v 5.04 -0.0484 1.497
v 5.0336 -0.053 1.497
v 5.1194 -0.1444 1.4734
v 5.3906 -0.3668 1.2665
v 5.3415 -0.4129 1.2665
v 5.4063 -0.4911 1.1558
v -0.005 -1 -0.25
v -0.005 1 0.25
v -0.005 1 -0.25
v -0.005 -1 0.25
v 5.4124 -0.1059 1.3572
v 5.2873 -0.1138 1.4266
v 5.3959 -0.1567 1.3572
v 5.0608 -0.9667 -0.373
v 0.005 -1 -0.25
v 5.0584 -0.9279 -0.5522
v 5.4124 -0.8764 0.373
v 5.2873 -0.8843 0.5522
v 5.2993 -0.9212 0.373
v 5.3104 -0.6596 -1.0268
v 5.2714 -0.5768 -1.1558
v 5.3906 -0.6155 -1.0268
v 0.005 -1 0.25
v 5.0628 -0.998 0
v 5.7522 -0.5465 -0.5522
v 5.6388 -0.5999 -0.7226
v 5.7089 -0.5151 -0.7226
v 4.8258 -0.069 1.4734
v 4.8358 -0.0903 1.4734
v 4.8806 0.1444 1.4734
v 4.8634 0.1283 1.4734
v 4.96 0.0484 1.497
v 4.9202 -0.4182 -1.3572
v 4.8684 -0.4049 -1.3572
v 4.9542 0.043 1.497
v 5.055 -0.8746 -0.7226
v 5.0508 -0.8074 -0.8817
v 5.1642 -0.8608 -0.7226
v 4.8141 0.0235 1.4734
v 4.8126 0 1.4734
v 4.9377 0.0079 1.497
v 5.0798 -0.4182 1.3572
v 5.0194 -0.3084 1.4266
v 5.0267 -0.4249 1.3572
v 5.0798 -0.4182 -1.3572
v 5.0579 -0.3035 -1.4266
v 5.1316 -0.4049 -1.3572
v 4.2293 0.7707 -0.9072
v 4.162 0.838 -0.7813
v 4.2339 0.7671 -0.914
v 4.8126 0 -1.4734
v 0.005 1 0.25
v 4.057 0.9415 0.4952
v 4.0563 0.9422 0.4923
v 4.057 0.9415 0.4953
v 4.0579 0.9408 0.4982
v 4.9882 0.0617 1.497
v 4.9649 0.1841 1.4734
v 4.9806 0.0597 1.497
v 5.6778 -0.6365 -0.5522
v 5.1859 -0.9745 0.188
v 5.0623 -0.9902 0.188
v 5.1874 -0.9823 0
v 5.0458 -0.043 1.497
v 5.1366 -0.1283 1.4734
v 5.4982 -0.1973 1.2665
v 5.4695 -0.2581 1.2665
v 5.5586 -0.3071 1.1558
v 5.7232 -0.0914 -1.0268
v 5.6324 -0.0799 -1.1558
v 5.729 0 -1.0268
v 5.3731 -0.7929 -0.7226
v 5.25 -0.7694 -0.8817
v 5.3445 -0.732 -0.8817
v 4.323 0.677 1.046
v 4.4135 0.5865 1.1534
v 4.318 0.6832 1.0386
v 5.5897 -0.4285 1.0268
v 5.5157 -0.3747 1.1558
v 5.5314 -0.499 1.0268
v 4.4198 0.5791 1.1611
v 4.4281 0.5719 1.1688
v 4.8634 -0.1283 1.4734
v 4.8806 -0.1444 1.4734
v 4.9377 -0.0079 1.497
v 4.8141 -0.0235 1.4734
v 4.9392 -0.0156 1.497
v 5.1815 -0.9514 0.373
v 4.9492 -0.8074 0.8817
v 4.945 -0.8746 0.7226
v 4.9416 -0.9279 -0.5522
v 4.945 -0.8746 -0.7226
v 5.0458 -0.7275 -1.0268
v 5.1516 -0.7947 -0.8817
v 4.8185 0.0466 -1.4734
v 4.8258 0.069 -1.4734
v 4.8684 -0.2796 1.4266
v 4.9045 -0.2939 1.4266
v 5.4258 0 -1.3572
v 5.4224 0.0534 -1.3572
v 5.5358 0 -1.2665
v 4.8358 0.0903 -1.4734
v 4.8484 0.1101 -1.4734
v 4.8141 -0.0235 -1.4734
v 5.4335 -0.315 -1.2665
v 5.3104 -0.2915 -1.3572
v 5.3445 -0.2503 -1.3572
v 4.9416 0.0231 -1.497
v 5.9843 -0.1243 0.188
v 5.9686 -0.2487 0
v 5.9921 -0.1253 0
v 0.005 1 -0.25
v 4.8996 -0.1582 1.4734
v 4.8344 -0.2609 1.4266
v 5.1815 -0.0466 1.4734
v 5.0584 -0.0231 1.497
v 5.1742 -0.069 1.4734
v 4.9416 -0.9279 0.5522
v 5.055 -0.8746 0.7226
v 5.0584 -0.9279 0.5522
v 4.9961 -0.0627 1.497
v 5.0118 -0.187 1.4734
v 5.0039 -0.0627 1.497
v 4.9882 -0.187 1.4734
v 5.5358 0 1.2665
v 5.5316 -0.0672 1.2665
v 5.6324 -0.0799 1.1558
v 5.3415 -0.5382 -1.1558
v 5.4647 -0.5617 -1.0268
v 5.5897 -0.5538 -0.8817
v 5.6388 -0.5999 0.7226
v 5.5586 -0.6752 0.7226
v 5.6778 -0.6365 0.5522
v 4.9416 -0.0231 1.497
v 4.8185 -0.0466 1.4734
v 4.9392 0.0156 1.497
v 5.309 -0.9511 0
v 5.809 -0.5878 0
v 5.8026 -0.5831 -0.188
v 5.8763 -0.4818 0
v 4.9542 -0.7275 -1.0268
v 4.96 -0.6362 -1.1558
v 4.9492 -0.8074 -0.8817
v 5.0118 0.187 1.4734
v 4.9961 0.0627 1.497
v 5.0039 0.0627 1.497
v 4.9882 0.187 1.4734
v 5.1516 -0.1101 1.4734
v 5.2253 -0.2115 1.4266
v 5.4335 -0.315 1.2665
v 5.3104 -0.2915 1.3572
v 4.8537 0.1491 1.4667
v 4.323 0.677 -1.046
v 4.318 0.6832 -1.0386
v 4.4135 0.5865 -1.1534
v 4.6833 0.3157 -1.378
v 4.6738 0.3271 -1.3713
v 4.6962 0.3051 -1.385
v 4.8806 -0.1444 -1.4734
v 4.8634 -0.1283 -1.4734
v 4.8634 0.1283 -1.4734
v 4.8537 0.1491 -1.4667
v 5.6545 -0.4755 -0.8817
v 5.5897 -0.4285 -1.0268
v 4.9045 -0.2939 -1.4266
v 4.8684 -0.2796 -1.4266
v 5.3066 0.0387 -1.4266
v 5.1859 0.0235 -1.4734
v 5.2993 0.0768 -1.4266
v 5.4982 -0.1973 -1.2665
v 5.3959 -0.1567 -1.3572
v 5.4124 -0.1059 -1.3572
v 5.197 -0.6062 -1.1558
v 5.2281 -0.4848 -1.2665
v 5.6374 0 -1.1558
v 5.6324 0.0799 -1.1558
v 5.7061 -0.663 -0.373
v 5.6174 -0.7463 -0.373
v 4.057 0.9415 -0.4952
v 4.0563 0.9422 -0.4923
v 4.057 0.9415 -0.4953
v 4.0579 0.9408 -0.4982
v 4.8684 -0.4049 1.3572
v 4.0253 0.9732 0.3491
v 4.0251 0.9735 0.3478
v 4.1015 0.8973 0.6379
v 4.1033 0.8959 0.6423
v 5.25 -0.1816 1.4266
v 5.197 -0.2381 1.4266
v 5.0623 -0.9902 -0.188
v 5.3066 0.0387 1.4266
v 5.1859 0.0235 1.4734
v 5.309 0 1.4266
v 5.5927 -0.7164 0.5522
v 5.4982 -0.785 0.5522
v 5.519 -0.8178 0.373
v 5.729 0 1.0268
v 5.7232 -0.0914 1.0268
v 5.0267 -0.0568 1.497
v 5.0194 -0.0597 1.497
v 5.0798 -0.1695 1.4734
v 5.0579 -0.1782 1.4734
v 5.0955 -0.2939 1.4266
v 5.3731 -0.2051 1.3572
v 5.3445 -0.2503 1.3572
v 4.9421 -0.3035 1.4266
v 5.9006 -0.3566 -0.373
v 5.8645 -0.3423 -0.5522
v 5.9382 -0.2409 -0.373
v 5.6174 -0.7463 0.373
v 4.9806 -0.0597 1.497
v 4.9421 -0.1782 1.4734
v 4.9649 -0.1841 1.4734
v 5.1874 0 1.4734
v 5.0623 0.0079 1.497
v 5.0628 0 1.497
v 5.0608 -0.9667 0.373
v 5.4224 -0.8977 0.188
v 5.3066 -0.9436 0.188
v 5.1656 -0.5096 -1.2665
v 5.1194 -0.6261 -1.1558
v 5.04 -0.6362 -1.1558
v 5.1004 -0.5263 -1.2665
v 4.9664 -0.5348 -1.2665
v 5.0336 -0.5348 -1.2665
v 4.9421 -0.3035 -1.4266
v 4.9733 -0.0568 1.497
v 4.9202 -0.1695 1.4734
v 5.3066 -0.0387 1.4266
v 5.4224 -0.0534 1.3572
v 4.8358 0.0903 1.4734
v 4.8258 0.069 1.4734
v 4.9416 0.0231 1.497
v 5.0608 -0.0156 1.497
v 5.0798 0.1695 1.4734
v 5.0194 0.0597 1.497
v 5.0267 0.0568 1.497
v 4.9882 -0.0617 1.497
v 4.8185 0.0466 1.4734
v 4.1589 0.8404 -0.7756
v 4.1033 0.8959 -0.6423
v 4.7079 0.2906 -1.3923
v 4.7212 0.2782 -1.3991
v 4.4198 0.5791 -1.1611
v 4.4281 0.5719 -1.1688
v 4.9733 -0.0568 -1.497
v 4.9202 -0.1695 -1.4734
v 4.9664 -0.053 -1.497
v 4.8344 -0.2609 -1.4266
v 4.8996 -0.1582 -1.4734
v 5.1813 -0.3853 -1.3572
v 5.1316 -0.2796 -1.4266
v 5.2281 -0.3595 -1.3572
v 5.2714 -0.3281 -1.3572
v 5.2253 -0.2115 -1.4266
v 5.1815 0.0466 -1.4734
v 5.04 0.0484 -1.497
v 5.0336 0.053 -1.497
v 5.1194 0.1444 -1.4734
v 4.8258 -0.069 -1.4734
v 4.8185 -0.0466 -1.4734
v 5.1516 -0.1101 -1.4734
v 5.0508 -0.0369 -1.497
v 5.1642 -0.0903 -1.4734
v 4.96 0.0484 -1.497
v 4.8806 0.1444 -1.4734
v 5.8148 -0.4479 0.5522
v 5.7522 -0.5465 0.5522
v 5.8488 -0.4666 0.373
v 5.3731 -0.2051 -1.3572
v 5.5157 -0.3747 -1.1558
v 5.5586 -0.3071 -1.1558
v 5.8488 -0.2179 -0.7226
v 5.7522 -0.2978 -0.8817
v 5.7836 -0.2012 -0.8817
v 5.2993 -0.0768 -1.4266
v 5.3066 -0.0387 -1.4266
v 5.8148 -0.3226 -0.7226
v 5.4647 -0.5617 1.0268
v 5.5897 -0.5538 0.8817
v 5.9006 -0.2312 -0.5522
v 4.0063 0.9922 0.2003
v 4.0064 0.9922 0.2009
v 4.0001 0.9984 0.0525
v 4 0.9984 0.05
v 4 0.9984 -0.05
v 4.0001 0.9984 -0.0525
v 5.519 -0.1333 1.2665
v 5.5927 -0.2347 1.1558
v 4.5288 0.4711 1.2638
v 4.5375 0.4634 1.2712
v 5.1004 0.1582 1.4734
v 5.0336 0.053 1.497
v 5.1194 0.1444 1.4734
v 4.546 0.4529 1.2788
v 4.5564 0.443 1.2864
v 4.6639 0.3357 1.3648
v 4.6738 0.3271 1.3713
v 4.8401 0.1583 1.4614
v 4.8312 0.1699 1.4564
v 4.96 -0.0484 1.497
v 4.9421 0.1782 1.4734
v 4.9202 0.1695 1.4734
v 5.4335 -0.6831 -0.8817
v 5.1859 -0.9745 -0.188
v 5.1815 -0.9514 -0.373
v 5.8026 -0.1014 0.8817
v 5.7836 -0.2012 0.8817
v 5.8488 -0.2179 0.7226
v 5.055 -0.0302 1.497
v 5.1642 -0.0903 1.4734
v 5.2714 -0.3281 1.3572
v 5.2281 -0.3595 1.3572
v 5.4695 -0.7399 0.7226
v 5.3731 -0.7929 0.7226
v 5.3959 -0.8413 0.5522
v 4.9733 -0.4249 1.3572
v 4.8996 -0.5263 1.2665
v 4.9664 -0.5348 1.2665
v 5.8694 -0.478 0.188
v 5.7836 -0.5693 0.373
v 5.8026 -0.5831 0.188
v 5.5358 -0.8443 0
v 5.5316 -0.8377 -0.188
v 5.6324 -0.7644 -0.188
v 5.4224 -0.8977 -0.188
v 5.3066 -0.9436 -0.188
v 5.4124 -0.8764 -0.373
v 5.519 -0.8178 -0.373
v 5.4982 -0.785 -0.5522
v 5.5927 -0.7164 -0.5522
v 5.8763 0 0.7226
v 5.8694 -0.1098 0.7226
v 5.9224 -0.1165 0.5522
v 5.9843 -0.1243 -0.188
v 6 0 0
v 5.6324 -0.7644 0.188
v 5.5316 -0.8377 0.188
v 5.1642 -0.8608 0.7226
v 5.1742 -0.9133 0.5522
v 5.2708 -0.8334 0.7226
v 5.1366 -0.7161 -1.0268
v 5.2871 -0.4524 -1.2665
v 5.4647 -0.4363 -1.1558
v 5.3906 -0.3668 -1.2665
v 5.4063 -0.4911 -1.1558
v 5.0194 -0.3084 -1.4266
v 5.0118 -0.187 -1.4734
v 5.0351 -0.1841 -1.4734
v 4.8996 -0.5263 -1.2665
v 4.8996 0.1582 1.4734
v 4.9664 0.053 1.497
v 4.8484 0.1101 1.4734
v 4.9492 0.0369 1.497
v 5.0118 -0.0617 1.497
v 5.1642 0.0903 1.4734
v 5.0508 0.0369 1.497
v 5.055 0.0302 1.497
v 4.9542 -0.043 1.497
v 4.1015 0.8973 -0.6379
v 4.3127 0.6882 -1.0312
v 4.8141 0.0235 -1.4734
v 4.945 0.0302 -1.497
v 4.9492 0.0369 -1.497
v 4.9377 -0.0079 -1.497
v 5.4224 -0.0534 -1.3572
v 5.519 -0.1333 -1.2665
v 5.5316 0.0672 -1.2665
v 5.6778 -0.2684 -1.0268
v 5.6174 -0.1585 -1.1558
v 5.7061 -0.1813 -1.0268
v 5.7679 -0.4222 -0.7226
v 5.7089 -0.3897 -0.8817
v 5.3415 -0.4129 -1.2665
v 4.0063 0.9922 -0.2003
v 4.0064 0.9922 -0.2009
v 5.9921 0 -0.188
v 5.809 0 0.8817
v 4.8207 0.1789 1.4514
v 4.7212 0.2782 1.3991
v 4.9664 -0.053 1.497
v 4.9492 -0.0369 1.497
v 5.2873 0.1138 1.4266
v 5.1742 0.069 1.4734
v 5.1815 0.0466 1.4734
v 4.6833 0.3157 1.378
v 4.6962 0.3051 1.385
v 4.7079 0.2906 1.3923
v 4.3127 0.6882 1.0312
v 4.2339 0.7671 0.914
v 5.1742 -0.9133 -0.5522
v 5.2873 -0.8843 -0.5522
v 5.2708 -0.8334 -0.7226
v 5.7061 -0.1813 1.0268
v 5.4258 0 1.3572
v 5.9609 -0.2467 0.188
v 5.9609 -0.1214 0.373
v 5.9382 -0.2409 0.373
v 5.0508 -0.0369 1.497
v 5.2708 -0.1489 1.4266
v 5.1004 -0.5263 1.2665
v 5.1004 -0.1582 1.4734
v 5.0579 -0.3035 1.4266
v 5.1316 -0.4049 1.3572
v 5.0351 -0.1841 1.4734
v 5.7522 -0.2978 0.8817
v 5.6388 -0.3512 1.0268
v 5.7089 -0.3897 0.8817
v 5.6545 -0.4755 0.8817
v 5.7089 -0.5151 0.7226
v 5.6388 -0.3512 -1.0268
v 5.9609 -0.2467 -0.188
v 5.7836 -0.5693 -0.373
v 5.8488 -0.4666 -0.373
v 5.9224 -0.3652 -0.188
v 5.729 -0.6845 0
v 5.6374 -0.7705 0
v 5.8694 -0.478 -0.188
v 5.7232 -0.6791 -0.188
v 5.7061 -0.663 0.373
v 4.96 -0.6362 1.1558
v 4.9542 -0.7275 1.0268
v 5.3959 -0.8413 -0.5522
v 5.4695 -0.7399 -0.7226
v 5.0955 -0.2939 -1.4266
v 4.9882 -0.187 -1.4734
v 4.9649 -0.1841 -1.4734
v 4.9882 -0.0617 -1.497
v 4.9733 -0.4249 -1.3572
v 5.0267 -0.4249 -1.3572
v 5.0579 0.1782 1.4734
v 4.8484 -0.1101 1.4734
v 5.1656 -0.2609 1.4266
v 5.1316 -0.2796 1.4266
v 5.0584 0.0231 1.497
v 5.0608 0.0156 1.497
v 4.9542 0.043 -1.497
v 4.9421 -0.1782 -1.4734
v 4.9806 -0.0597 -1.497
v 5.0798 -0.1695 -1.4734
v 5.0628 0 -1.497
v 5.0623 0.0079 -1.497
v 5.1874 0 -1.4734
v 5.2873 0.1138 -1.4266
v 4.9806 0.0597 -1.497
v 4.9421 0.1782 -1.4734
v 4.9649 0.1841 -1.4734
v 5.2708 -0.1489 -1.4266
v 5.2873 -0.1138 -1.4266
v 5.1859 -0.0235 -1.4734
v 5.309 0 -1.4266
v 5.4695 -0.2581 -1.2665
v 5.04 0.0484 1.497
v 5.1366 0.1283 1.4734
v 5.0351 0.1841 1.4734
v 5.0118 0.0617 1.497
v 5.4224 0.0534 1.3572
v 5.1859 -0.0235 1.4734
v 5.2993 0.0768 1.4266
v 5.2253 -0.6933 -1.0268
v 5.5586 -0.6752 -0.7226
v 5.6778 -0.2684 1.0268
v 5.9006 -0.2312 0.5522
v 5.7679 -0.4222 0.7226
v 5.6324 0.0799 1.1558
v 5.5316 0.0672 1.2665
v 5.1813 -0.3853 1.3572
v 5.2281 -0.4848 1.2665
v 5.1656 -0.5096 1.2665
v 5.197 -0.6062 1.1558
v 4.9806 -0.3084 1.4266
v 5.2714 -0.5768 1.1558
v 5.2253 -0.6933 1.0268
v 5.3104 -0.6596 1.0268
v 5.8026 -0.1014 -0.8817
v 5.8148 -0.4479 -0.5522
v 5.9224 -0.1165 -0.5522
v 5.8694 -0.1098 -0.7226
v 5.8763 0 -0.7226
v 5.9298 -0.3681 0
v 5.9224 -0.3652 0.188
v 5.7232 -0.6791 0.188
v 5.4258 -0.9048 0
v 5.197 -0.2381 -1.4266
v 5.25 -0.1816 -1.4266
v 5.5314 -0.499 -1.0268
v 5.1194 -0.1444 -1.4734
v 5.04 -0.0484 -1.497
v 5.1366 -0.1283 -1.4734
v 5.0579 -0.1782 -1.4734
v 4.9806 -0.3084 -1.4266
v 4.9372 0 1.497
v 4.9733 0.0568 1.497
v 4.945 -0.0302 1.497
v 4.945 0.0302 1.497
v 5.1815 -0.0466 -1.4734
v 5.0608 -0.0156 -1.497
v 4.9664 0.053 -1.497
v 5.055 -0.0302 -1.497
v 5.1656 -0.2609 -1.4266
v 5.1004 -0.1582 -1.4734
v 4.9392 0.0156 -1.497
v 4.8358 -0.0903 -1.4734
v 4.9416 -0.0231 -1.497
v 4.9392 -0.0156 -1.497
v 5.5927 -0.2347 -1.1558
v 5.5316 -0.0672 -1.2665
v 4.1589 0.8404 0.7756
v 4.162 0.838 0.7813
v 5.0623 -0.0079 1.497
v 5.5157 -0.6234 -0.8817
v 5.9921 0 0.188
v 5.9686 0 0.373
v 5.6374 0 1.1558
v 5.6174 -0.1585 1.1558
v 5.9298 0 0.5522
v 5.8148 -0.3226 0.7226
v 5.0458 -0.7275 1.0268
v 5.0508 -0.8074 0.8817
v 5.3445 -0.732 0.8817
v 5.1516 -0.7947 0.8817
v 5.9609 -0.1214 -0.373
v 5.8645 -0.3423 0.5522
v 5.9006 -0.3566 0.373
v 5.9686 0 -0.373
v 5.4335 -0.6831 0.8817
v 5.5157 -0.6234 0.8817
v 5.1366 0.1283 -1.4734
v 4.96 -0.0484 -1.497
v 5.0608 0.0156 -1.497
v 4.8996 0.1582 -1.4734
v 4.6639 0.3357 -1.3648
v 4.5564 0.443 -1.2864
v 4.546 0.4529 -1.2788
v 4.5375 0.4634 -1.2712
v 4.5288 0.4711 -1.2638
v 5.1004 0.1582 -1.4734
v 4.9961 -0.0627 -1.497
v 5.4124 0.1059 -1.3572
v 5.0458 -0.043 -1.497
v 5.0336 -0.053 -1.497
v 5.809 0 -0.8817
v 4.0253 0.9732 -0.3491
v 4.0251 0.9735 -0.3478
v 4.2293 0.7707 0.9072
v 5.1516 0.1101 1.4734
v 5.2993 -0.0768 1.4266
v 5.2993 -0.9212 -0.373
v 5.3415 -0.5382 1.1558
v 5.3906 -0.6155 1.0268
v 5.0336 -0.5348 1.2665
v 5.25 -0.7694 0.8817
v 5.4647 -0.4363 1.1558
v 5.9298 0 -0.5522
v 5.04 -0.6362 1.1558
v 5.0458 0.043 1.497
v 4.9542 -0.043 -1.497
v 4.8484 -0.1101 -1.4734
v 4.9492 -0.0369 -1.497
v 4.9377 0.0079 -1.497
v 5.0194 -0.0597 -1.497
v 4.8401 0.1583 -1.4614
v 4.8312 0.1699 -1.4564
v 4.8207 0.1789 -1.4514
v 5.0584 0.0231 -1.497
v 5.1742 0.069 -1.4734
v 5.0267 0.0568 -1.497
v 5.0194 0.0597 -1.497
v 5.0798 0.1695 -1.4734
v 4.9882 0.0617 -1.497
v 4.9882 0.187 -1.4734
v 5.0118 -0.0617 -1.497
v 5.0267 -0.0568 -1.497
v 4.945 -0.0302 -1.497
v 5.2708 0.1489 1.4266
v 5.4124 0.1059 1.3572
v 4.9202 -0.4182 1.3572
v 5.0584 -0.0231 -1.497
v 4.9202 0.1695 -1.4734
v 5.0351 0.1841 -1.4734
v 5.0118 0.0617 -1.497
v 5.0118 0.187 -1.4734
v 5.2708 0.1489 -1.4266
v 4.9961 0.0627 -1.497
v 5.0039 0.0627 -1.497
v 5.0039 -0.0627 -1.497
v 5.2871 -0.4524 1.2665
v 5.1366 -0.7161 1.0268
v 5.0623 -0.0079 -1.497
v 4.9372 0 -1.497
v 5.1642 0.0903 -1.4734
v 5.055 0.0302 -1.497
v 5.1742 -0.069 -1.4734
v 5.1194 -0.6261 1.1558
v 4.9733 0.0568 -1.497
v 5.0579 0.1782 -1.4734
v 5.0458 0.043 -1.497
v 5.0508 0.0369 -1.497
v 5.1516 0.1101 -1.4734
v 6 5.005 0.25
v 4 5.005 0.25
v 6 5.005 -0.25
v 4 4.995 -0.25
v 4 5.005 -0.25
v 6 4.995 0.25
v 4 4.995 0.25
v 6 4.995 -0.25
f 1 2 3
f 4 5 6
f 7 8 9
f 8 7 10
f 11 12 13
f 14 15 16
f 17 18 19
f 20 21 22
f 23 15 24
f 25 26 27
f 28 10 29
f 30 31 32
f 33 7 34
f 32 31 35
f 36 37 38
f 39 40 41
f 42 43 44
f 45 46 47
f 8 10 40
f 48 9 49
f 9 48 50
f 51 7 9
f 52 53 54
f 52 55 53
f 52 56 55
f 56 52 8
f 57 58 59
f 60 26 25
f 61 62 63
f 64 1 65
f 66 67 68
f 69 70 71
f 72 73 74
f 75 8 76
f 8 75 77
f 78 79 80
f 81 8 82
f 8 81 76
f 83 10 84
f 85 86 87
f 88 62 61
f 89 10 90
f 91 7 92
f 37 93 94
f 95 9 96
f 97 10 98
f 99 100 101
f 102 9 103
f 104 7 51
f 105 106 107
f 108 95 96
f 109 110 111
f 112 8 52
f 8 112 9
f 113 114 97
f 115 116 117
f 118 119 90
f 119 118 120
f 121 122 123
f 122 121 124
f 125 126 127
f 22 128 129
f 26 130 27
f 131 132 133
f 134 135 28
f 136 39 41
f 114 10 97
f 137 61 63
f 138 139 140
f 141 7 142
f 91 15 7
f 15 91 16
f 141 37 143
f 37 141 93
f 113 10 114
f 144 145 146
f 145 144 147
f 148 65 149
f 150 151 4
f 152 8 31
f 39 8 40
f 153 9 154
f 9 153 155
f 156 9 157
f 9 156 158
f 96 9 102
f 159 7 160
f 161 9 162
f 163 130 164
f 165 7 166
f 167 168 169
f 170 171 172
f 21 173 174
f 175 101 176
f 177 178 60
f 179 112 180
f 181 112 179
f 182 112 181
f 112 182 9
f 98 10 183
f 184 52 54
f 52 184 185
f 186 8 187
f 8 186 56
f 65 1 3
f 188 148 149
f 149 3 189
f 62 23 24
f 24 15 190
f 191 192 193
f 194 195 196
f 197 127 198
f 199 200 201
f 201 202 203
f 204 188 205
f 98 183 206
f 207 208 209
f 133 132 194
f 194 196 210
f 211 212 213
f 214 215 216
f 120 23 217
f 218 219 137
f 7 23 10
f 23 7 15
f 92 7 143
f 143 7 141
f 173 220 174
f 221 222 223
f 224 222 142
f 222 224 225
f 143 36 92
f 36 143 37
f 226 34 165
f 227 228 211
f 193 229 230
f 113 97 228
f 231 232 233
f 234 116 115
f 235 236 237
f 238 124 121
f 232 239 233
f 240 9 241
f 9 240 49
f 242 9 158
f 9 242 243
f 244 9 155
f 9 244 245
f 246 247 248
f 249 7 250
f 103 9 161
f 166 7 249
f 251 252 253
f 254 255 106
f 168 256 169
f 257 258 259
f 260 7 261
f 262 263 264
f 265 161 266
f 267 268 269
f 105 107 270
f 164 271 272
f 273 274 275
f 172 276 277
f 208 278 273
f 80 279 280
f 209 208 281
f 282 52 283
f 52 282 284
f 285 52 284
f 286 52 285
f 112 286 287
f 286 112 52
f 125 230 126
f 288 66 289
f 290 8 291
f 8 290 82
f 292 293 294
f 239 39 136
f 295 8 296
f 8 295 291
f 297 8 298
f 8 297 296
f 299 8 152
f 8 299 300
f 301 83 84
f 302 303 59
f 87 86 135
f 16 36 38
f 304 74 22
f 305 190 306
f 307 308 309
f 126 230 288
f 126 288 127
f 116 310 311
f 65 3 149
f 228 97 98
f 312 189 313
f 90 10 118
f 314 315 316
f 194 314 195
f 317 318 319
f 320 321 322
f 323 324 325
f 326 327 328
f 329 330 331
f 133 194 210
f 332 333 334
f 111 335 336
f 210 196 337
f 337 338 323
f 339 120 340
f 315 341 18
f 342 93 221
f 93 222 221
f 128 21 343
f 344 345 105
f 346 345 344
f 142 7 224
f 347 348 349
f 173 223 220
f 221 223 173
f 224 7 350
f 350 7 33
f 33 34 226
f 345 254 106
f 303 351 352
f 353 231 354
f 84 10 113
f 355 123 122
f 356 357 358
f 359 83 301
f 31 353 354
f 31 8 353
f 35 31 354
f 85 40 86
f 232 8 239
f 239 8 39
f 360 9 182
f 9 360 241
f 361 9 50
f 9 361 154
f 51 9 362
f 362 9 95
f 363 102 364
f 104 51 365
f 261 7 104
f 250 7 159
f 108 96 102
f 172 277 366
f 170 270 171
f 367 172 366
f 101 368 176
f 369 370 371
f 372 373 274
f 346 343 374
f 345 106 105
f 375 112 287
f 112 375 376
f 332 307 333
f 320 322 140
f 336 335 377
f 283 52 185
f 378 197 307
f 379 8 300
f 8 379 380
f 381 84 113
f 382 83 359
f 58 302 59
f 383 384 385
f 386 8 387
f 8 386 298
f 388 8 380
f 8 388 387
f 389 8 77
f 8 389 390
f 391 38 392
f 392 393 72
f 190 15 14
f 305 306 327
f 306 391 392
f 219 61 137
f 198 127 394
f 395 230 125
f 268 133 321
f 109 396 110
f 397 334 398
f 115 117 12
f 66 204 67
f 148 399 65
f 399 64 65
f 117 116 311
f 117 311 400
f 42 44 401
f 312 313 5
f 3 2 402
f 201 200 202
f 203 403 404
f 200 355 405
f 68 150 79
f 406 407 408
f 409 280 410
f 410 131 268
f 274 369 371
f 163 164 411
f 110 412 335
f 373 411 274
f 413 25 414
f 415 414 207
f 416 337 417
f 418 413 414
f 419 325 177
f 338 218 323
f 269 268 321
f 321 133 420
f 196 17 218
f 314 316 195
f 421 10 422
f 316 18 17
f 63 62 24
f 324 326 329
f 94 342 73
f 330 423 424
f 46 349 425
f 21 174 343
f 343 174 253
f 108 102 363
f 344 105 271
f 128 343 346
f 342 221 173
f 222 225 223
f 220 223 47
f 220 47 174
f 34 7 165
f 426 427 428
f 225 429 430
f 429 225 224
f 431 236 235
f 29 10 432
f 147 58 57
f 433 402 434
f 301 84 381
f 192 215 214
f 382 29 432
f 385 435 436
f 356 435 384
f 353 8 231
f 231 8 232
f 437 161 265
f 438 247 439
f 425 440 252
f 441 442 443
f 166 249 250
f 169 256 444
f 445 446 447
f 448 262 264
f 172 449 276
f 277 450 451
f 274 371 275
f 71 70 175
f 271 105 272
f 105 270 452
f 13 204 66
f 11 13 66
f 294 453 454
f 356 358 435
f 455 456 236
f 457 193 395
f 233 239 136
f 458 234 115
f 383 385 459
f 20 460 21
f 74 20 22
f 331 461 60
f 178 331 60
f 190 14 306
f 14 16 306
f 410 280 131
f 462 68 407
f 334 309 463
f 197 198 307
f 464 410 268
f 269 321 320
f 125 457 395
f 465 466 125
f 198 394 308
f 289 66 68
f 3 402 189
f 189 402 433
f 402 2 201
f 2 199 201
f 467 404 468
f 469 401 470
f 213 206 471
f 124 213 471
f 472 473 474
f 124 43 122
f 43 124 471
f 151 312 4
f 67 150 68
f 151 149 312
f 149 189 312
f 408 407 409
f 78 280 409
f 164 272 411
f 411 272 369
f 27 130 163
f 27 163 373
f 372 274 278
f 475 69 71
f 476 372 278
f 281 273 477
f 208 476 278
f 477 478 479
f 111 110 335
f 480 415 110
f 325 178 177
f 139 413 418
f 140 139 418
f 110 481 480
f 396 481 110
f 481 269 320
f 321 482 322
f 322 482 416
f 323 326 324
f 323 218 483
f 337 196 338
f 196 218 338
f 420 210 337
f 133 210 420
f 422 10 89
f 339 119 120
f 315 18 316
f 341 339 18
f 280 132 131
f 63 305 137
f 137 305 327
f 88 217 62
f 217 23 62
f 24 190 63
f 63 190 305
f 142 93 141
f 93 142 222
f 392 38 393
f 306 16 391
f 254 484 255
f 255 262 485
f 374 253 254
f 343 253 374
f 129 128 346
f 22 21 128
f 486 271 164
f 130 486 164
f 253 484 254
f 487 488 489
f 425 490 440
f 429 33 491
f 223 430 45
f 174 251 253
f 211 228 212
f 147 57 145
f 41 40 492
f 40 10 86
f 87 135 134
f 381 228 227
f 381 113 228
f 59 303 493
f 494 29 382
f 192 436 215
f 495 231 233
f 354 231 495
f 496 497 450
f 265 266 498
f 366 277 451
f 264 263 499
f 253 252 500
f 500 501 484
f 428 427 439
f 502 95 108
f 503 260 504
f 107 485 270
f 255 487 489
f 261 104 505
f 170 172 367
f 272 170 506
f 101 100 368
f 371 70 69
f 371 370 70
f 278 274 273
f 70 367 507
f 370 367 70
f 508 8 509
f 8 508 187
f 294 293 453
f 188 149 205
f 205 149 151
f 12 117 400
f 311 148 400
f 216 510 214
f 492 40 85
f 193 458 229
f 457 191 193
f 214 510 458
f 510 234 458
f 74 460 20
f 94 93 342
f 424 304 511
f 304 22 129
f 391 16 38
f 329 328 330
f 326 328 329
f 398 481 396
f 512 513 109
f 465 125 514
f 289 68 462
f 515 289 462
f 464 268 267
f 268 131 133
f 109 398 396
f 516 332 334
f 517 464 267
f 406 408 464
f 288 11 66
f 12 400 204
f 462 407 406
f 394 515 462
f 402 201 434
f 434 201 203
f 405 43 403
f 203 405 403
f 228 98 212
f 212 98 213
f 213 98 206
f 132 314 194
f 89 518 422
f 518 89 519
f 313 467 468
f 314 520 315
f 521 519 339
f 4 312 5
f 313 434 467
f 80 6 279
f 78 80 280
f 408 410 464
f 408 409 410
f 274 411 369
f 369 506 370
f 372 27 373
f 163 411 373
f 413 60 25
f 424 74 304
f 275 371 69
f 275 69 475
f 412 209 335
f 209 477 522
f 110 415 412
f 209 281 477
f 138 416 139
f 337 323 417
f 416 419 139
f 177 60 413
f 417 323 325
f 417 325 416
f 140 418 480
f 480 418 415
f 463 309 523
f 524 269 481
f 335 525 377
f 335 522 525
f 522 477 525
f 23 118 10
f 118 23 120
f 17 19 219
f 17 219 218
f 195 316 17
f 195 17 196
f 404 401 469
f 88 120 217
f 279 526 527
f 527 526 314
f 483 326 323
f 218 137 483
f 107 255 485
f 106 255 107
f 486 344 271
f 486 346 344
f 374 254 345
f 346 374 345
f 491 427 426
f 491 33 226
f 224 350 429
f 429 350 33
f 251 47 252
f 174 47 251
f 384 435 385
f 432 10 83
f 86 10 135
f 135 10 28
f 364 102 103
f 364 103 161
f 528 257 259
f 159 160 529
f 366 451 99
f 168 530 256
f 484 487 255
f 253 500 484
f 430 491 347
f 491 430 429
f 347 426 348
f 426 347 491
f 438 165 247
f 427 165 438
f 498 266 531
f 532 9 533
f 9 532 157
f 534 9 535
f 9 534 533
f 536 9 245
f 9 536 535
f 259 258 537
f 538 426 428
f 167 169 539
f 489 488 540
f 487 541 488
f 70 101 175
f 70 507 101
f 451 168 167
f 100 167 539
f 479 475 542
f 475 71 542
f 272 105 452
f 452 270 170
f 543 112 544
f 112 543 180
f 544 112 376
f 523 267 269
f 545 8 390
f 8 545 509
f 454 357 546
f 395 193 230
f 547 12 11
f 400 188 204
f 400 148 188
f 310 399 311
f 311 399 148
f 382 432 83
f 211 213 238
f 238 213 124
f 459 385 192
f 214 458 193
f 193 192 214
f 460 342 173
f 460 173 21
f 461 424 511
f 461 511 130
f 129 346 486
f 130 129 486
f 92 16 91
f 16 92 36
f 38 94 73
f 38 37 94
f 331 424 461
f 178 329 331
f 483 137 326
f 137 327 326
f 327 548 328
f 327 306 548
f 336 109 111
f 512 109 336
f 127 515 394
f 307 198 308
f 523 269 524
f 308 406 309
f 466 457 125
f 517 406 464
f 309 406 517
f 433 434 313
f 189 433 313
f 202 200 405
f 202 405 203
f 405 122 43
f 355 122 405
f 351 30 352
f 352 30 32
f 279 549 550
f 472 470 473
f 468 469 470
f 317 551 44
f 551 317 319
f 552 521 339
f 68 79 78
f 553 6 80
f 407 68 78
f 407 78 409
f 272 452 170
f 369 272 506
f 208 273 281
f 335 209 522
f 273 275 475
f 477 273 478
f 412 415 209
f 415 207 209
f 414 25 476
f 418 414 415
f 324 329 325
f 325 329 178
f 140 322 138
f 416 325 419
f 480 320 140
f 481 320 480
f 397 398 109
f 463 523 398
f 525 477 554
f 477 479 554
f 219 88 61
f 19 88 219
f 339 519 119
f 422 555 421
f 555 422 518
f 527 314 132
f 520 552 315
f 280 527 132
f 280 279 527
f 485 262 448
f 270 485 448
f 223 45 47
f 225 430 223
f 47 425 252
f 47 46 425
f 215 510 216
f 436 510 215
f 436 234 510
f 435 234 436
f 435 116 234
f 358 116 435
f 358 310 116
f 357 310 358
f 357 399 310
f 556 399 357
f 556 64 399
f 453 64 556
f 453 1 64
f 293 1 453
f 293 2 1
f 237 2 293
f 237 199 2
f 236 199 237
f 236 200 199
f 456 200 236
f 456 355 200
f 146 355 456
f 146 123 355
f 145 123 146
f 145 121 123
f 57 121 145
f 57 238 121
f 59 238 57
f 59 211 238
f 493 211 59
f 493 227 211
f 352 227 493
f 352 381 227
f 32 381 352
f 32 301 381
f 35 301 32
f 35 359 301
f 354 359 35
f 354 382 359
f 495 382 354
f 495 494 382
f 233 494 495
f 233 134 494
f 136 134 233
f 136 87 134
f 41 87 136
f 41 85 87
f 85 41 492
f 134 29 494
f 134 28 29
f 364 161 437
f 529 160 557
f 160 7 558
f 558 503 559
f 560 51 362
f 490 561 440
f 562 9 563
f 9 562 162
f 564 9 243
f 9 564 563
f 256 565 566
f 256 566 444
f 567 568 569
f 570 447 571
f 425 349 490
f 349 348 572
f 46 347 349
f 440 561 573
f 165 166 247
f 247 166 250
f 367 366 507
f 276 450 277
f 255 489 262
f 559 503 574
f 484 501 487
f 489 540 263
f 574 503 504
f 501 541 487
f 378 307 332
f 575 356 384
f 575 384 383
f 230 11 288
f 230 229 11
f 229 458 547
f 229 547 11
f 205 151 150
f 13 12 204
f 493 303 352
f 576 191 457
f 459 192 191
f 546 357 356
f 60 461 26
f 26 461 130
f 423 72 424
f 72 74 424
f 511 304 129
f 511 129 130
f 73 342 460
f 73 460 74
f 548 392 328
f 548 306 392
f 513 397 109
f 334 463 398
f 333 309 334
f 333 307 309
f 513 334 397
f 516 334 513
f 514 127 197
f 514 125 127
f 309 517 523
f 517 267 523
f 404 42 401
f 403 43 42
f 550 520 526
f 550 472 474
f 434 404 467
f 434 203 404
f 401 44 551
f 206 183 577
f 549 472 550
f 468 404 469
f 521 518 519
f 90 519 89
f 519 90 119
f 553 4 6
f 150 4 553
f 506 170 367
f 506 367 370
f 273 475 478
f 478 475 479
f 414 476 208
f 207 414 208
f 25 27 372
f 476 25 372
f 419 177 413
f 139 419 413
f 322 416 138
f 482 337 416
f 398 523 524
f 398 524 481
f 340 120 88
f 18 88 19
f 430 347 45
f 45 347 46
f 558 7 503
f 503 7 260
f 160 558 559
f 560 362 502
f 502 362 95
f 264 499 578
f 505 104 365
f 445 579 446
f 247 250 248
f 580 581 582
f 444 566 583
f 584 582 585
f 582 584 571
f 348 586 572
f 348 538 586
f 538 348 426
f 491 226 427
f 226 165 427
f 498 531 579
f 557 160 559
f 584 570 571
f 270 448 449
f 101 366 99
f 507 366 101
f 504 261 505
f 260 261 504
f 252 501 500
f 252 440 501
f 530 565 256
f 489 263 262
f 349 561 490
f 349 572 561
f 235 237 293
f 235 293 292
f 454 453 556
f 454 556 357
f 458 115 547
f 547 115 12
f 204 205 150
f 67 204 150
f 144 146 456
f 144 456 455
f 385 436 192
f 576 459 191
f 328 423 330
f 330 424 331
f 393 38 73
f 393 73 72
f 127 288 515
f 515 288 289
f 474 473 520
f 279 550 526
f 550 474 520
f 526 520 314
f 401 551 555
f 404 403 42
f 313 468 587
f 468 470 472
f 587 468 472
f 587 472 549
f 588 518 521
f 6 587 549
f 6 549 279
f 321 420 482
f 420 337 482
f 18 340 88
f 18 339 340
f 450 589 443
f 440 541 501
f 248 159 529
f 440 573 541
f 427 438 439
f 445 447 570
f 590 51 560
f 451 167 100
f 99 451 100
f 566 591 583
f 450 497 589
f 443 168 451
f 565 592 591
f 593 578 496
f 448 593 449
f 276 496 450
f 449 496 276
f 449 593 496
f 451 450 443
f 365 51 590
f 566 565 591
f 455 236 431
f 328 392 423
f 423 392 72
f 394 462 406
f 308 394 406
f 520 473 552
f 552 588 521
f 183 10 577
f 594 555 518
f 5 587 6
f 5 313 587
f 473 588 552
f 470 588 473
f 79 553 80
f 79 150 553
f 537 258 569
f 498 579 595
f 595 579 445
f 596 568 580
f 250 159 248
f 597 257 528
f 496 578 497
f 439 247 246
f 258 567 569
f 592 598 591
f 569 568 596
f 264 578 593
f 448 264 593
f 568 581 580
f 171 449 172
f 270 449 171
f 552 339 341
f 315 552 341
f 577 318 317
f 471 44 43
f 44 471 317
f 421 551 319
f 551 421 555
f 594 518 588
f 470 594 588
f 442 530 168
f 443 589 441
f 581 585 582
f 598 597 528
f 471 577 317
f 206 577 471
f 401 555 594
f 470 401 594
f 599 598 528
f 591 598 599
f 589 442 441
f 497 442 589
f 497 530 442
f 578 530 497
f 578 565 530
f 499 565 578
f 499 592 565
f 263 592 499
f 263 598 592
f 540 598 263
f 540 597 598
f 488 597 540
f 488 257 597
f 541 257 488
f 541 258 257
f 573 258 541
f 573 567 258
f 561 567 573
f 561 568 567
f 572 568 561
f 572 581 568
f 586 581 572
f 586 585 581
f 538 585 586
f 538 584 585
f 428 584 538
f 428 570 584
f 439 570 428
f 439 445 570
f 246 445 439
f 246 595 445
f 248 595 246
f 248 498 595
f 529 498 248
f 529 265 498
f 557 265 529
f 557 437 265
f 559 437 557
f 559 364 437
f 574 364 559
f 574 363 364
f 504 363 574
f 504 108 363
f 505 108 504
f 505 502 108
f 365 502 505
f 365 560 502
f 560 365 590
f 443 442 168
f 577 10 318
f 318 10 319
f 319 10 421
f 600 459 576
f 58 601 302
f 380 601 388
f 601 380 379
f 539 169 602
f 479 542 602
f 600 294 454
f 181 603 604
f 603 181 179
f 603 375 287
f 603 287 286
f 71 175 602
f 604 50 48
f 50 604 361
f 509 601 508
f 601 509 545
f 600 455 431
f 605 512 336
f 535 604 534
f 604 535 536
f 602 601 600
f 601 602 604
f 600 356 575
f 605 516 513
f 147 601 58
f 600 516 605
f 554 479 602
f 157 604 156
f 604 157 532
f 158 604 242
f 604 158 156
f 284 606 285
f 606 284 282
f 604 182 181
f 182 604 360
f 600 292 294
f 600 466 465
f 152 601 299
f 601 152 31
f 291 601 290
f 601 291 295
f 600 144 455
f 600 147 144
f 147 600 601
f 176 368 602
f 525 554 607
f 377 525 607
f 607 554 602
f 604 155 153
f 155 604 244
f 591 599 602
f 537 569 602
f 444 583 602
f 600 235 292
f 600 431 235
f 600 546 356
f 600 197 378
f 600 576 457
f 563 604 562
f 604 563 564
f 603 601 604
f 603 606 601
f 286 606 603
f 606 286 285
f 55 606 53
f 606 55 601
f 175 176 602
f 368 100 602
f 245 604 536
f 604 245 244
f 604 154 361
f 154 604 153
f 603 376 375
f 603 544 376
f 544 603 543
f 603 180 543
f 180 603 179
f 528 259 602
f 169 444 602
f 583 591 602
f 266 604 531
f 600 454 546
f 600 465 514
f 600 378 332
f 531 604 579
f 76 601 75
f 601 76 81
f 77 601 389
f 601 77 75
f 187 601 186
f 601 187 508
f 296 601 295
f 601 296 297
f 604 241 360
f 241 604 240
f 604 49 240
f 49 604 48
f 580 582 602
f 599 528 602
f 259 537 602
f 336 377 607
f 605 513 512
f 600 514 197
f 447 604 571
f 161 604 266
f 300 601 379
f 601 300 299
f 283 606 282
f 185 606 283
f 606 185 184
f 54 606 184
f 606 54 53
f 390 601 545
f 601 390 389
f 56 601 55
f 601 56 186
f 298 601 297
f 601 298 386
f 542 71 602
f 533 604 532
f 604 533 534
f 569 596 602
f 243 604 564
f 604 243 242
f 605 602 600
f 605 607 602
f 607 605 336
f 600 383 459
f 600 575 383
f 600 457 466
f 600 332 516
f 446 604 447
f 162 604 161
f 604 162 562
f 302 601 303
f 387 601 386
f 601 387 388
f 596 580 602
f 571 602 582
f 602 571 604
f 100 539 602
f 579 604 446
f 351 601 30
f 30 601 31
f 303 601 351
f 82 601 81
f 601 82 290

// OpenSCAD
use <../polychannel.scad>

// Shortcuts
function cs(size, position, ang=[0, [0,0,1]]) = cube_shape(size, position, ang);
function ss(size, position, ang=[0, [0,0,1]]) = sphere_shape(size, position, ang);

cube_size = [0.01, 2, 0.5];
sphere_size = [2, 2, 3];

polychannel(
    [
        cs(cube_size, [0, 0, 0]),
        ss(sphere_size, [5, 0, 0]),
        cs(cube_size, [0, 5, 0], [90, [0, 0, 1]]),
    ]
);
